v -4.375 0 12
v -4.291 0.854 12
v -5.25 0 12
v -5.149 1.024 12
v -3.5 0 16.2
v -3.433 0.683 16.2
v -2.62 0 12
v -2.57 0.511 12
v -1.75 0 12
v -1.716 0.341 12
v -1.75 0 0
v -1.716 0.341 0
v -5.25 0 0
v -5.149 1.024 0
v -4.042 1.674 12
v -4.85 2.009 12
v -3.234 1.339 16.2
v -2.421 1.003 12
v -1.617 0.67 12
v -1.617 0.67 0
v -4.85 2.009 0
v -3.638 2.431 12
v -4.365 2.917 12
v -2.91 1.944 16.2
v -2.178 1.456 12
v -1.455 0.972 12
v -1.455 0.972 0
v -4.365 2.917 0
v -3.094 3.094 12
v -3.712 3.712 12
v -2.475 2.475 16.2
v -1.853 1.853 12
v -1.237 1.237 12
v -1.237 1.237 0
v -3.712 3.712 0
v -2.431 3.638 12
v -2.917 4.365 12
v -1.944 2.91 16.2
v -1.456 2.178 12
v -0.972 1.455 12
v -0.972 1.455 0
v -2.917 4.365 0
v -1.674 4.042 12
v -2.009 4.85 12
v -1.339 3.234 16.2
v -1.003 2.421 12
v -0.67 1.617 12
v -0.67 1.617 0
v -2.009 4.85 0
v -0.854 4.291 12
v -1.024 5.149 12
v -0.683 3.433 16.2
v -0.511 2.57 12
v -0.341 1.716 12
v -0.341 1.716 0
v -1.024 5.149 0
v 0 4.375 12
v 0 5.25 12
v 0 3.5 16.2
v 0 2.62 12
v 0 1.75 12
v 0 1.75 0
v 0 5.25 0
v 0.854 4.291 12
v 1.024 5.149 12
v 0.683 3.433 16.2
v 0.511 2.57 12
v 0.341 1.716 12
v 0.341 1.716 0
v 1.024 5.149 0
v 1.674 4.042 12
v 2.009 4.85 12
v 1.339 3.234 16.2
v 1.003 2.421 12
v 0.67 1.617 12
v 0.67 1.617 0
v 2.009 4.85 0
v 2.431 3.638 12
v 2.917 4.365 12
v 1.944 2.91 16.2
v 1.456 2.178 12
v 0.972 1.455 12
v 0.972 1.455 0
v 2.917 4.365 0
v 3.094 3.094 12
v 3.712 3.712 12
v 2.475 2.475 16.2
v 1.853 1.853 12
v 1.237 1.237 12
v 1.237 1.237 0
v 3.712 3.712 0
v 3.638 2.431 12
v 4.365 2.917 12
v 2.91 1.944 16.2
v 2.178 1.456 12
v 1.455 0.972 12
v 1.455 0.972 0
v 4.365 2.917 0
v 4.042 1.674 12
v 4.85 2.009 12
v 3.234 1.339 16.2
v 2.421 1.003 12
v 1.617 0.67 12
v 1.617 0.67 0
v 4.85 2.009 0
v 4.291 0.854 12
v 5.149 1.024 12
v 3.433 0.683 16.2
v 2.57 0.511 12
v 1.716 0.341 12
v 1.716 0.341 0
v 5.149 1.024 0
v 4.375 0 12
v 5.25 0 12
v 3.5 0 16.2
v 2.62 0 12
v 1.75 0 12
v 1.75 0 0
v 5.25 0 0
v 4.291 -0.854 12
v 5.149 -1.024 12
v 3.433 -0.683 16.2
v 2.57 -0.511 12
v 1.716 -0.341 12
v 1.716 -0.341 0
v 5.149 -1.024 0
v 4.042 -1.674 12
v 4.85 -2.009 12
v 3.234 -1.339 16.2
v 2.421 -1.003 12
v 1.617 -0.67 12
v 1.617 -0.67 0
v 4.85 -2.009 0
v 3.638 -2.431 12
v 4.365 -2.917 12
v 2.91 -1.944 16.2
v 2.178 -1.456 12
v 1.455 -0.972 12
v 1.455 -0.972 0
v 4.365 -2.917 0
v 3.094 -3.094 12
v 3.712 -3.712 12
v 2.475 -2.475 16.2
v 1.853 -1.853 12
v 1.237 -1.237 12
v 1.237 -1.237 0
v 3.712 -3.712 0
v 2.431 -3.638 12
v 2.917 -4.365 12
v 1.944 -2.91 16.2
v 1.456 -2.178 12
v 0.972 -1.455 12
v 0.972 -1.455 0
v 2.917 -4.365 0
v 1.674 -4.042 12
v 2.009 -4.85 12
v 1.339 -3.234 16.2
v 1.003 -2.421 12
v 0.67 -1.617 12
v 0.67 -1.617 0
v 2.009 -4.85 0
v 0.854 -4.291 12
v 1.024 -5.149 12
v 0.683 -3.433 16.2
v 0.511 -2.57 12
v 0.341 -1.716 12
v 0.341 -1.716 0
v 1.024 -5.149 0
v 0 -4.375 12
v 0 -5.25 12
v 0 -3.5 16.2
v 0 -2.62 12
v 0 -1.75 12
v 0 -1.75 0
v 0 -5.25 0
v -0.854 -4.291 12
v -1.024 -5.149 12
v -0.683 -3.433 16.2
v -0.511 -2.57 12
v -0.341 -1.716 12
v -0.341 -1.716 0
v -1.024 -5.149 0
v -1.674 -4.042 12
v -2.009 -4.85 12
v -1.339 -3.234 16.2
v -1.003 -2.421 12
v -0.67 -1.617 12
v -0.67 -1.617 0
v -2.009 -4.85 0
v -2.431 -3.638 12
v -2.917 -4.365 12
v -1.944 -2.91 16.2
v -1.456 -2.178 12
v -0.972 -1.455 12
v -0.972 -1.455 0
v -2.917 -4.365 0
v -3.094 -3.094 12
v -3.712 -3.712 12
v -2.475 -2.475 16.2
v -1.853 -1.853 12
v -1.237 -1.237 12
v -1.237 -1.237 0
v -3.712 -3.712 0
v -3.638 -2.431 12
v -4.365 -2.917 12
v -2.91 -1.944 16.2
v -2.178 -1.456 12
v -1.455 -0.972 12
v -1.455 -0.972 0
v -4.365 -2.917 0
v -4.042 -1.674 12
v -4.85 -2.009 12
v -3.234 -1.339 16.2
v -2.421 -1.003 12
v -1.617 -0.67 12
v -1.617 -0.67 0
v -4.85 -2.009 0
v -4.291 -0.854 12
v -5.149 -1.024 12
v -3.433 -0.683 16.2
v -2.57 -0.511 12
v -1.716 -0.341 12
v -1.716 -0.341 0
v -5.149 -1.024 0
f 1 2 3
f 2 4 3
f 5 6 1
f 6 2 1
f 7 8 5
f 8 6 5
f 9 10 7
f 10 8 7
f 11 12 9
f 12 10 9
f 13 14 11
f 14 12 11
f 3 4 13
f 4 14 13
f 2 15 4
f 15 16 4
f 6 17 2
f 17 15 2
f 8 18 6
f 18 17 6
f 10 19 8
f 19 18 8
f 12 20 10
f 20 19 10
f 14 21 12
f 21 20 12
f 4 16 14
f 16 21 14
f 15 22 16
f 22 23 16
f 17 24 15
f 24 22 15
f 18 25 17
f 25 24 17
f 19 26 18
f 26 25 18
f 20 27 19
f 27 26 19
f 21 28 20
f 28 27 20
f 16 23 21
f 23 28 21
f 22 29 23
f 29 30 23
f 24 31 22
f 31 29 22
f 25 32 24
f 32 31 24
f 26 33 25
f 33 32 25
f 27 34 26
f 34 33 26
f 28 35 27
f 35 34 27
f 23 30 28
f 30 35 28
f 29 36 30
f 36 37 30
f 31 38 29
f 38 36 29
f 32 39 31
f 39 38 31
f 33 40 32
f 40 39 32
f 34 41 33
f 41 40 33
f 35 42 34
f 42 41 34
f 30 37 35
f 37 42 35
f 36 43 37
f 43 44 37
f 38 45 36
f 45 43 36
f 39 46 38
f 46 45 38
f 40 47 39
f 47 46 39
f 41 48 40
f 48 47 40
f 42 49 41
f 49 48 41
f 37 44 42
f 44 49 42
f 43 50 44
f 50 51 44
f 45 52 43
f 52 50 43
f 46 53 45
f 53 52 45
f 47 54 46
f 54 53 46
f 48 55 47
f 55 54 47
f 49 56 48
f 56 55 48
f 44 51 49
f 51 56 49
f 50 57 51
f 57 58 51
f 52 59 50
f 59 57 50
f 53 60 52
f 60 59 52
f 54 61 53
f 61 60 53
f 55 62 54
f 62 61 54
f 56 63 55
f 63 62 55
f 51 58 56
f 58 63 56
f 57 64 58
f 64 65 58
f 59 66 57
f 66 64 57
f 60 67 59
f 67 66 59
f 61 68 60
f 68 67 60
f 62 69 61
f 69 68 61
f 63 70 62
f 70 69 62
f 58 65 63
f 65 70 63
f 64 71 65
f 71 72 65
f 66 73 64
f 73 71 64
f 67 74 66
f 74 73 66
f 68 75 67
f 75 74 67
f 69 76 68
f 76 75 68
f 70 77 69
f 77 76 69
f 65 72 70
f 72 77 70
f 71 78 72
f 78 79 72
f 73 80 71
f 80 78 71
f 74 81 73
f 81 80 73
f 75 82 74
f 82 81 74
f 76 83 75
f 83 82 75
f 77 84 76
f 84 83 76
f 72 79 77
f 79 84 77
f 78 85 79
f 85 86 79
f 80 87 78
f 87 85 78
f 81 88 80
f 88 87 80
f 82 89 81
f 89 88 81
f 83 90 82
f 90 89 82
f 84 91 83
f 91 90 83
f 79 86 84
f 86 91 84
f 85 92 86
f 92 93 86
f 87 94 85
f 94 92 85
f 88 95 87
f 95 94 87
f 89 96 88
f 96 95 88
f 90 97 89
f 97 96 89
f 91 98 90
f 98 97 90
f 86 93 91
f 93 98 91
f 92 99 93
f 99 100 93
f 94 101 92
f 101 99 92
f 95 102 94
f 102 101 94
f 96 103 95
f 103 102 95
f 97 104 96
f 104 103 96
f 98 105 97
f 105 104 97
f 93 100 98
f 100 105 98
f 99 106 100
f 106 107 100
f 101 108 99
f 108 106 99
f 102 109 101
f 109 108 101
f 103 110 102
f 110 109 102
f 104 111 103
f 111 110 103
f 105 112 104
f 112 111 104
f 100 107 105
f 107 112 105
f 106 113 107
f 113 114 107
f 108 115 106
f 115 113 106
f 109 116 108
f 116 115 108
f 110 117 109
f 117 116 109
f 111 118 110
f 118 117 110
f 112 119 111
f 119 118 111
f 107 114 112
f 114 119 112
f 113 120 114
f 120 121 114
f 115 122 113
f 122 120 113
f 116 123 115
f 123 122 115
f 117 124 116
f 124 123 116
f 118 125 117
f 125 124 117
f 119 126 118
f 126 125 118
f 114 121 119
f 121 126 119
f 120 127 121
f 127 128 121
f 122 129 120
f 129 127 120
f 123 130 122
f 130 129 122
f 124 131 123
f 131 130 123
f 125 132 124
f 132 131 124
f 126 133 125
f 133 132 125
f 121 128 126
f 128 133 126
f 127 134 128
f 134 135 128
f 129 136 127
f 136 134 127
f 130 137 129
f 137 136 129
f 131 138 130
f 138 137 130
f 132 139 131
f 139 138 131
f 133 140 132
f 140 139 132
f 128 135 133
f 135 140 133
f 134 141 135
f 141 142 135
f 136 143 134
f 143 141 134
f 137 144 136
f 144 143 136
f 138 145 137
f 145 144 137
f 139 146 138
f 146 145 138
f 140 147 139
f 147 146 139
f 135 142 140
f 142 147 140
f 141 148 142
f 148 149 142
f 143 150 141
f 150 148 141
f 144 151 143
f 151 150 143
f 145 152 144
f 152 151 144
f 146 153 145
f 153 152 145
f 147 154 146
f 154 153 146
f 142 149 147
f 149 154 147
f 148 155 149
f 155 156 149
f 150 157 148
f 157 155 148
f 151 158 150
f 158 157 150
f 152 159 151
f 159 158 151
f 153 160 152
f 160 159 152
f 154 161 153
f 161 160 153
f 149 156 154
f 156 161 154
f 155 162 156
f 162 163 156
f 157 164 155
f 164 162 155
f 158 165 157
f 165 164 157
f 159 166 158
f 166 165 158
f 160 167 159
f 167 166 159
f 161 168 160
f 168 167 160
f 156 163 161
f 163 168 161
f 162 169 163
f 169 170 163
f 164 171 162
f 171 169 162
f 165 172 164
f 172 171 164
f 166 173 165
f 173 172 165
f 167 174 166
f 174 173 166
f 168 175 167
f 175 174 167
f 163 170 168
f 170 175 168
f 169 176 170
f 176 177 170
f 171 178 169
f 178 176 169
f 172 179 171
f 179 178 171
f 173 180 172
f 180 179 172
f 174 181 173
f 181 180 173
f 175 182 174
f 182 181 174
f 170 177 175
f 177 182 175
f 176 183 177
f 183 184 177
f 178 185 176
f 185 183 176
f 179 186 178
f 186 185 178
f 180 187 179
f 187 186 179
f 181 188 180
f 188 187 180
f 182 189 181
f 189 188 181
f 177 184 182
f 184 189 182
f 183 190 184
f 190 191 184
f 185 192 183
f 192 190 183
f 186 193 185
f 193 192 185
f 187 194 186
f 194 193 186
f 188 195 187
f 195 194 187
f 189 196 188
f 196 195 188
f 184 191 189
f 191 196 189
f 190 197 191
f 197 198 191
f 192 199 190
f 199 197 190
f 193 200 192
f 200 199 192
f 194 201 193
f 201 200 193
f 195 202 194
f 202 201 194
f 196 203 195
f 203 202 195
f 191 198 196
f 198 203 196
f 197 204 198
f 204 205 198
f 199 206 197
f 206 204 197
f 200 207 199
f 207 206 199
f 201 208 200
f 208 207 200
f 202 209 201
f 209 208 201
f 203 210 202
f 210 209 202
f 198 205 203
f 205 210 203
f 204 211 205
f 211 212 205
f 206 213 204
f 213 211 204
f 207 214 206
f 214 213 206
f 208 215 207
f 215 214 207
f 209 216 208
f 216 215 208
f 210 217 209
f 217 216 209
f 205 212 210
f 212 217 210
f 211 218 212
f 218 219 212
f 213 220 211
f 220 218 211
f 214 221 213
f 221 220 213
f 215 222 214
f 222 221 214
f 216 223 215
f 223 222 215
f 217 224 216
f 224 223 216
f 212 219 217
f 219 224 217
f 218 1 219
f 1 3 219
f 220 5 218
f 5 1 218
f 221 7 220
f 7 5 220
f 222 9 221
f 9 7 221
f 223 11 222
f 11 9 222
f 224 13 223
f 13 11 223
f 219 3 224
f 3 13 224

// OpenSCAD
$fn = 32;

// ----------------------------------------------------------------------
// Form washer: domed washer, 10.5 mm outside, 3.5 mm bore
// ----------------------------------------------------------------------

// --- parameters (mm) ---
revolve_angle = 360;      // full turn around the Z axis
profile_points = 7;       // points of the closed outline

profile = [[1.75, 0], [5.25, 0], [5.25, 12], [4.375, 12], [3.5, 16.2], [2.62, 12], [1.75, 12]];  // single closed polygon, 7 points, counter clockwise

// --- the one profile operation ---
rotate_extrude(angle = revolve_angle) polygon(points = profile);
